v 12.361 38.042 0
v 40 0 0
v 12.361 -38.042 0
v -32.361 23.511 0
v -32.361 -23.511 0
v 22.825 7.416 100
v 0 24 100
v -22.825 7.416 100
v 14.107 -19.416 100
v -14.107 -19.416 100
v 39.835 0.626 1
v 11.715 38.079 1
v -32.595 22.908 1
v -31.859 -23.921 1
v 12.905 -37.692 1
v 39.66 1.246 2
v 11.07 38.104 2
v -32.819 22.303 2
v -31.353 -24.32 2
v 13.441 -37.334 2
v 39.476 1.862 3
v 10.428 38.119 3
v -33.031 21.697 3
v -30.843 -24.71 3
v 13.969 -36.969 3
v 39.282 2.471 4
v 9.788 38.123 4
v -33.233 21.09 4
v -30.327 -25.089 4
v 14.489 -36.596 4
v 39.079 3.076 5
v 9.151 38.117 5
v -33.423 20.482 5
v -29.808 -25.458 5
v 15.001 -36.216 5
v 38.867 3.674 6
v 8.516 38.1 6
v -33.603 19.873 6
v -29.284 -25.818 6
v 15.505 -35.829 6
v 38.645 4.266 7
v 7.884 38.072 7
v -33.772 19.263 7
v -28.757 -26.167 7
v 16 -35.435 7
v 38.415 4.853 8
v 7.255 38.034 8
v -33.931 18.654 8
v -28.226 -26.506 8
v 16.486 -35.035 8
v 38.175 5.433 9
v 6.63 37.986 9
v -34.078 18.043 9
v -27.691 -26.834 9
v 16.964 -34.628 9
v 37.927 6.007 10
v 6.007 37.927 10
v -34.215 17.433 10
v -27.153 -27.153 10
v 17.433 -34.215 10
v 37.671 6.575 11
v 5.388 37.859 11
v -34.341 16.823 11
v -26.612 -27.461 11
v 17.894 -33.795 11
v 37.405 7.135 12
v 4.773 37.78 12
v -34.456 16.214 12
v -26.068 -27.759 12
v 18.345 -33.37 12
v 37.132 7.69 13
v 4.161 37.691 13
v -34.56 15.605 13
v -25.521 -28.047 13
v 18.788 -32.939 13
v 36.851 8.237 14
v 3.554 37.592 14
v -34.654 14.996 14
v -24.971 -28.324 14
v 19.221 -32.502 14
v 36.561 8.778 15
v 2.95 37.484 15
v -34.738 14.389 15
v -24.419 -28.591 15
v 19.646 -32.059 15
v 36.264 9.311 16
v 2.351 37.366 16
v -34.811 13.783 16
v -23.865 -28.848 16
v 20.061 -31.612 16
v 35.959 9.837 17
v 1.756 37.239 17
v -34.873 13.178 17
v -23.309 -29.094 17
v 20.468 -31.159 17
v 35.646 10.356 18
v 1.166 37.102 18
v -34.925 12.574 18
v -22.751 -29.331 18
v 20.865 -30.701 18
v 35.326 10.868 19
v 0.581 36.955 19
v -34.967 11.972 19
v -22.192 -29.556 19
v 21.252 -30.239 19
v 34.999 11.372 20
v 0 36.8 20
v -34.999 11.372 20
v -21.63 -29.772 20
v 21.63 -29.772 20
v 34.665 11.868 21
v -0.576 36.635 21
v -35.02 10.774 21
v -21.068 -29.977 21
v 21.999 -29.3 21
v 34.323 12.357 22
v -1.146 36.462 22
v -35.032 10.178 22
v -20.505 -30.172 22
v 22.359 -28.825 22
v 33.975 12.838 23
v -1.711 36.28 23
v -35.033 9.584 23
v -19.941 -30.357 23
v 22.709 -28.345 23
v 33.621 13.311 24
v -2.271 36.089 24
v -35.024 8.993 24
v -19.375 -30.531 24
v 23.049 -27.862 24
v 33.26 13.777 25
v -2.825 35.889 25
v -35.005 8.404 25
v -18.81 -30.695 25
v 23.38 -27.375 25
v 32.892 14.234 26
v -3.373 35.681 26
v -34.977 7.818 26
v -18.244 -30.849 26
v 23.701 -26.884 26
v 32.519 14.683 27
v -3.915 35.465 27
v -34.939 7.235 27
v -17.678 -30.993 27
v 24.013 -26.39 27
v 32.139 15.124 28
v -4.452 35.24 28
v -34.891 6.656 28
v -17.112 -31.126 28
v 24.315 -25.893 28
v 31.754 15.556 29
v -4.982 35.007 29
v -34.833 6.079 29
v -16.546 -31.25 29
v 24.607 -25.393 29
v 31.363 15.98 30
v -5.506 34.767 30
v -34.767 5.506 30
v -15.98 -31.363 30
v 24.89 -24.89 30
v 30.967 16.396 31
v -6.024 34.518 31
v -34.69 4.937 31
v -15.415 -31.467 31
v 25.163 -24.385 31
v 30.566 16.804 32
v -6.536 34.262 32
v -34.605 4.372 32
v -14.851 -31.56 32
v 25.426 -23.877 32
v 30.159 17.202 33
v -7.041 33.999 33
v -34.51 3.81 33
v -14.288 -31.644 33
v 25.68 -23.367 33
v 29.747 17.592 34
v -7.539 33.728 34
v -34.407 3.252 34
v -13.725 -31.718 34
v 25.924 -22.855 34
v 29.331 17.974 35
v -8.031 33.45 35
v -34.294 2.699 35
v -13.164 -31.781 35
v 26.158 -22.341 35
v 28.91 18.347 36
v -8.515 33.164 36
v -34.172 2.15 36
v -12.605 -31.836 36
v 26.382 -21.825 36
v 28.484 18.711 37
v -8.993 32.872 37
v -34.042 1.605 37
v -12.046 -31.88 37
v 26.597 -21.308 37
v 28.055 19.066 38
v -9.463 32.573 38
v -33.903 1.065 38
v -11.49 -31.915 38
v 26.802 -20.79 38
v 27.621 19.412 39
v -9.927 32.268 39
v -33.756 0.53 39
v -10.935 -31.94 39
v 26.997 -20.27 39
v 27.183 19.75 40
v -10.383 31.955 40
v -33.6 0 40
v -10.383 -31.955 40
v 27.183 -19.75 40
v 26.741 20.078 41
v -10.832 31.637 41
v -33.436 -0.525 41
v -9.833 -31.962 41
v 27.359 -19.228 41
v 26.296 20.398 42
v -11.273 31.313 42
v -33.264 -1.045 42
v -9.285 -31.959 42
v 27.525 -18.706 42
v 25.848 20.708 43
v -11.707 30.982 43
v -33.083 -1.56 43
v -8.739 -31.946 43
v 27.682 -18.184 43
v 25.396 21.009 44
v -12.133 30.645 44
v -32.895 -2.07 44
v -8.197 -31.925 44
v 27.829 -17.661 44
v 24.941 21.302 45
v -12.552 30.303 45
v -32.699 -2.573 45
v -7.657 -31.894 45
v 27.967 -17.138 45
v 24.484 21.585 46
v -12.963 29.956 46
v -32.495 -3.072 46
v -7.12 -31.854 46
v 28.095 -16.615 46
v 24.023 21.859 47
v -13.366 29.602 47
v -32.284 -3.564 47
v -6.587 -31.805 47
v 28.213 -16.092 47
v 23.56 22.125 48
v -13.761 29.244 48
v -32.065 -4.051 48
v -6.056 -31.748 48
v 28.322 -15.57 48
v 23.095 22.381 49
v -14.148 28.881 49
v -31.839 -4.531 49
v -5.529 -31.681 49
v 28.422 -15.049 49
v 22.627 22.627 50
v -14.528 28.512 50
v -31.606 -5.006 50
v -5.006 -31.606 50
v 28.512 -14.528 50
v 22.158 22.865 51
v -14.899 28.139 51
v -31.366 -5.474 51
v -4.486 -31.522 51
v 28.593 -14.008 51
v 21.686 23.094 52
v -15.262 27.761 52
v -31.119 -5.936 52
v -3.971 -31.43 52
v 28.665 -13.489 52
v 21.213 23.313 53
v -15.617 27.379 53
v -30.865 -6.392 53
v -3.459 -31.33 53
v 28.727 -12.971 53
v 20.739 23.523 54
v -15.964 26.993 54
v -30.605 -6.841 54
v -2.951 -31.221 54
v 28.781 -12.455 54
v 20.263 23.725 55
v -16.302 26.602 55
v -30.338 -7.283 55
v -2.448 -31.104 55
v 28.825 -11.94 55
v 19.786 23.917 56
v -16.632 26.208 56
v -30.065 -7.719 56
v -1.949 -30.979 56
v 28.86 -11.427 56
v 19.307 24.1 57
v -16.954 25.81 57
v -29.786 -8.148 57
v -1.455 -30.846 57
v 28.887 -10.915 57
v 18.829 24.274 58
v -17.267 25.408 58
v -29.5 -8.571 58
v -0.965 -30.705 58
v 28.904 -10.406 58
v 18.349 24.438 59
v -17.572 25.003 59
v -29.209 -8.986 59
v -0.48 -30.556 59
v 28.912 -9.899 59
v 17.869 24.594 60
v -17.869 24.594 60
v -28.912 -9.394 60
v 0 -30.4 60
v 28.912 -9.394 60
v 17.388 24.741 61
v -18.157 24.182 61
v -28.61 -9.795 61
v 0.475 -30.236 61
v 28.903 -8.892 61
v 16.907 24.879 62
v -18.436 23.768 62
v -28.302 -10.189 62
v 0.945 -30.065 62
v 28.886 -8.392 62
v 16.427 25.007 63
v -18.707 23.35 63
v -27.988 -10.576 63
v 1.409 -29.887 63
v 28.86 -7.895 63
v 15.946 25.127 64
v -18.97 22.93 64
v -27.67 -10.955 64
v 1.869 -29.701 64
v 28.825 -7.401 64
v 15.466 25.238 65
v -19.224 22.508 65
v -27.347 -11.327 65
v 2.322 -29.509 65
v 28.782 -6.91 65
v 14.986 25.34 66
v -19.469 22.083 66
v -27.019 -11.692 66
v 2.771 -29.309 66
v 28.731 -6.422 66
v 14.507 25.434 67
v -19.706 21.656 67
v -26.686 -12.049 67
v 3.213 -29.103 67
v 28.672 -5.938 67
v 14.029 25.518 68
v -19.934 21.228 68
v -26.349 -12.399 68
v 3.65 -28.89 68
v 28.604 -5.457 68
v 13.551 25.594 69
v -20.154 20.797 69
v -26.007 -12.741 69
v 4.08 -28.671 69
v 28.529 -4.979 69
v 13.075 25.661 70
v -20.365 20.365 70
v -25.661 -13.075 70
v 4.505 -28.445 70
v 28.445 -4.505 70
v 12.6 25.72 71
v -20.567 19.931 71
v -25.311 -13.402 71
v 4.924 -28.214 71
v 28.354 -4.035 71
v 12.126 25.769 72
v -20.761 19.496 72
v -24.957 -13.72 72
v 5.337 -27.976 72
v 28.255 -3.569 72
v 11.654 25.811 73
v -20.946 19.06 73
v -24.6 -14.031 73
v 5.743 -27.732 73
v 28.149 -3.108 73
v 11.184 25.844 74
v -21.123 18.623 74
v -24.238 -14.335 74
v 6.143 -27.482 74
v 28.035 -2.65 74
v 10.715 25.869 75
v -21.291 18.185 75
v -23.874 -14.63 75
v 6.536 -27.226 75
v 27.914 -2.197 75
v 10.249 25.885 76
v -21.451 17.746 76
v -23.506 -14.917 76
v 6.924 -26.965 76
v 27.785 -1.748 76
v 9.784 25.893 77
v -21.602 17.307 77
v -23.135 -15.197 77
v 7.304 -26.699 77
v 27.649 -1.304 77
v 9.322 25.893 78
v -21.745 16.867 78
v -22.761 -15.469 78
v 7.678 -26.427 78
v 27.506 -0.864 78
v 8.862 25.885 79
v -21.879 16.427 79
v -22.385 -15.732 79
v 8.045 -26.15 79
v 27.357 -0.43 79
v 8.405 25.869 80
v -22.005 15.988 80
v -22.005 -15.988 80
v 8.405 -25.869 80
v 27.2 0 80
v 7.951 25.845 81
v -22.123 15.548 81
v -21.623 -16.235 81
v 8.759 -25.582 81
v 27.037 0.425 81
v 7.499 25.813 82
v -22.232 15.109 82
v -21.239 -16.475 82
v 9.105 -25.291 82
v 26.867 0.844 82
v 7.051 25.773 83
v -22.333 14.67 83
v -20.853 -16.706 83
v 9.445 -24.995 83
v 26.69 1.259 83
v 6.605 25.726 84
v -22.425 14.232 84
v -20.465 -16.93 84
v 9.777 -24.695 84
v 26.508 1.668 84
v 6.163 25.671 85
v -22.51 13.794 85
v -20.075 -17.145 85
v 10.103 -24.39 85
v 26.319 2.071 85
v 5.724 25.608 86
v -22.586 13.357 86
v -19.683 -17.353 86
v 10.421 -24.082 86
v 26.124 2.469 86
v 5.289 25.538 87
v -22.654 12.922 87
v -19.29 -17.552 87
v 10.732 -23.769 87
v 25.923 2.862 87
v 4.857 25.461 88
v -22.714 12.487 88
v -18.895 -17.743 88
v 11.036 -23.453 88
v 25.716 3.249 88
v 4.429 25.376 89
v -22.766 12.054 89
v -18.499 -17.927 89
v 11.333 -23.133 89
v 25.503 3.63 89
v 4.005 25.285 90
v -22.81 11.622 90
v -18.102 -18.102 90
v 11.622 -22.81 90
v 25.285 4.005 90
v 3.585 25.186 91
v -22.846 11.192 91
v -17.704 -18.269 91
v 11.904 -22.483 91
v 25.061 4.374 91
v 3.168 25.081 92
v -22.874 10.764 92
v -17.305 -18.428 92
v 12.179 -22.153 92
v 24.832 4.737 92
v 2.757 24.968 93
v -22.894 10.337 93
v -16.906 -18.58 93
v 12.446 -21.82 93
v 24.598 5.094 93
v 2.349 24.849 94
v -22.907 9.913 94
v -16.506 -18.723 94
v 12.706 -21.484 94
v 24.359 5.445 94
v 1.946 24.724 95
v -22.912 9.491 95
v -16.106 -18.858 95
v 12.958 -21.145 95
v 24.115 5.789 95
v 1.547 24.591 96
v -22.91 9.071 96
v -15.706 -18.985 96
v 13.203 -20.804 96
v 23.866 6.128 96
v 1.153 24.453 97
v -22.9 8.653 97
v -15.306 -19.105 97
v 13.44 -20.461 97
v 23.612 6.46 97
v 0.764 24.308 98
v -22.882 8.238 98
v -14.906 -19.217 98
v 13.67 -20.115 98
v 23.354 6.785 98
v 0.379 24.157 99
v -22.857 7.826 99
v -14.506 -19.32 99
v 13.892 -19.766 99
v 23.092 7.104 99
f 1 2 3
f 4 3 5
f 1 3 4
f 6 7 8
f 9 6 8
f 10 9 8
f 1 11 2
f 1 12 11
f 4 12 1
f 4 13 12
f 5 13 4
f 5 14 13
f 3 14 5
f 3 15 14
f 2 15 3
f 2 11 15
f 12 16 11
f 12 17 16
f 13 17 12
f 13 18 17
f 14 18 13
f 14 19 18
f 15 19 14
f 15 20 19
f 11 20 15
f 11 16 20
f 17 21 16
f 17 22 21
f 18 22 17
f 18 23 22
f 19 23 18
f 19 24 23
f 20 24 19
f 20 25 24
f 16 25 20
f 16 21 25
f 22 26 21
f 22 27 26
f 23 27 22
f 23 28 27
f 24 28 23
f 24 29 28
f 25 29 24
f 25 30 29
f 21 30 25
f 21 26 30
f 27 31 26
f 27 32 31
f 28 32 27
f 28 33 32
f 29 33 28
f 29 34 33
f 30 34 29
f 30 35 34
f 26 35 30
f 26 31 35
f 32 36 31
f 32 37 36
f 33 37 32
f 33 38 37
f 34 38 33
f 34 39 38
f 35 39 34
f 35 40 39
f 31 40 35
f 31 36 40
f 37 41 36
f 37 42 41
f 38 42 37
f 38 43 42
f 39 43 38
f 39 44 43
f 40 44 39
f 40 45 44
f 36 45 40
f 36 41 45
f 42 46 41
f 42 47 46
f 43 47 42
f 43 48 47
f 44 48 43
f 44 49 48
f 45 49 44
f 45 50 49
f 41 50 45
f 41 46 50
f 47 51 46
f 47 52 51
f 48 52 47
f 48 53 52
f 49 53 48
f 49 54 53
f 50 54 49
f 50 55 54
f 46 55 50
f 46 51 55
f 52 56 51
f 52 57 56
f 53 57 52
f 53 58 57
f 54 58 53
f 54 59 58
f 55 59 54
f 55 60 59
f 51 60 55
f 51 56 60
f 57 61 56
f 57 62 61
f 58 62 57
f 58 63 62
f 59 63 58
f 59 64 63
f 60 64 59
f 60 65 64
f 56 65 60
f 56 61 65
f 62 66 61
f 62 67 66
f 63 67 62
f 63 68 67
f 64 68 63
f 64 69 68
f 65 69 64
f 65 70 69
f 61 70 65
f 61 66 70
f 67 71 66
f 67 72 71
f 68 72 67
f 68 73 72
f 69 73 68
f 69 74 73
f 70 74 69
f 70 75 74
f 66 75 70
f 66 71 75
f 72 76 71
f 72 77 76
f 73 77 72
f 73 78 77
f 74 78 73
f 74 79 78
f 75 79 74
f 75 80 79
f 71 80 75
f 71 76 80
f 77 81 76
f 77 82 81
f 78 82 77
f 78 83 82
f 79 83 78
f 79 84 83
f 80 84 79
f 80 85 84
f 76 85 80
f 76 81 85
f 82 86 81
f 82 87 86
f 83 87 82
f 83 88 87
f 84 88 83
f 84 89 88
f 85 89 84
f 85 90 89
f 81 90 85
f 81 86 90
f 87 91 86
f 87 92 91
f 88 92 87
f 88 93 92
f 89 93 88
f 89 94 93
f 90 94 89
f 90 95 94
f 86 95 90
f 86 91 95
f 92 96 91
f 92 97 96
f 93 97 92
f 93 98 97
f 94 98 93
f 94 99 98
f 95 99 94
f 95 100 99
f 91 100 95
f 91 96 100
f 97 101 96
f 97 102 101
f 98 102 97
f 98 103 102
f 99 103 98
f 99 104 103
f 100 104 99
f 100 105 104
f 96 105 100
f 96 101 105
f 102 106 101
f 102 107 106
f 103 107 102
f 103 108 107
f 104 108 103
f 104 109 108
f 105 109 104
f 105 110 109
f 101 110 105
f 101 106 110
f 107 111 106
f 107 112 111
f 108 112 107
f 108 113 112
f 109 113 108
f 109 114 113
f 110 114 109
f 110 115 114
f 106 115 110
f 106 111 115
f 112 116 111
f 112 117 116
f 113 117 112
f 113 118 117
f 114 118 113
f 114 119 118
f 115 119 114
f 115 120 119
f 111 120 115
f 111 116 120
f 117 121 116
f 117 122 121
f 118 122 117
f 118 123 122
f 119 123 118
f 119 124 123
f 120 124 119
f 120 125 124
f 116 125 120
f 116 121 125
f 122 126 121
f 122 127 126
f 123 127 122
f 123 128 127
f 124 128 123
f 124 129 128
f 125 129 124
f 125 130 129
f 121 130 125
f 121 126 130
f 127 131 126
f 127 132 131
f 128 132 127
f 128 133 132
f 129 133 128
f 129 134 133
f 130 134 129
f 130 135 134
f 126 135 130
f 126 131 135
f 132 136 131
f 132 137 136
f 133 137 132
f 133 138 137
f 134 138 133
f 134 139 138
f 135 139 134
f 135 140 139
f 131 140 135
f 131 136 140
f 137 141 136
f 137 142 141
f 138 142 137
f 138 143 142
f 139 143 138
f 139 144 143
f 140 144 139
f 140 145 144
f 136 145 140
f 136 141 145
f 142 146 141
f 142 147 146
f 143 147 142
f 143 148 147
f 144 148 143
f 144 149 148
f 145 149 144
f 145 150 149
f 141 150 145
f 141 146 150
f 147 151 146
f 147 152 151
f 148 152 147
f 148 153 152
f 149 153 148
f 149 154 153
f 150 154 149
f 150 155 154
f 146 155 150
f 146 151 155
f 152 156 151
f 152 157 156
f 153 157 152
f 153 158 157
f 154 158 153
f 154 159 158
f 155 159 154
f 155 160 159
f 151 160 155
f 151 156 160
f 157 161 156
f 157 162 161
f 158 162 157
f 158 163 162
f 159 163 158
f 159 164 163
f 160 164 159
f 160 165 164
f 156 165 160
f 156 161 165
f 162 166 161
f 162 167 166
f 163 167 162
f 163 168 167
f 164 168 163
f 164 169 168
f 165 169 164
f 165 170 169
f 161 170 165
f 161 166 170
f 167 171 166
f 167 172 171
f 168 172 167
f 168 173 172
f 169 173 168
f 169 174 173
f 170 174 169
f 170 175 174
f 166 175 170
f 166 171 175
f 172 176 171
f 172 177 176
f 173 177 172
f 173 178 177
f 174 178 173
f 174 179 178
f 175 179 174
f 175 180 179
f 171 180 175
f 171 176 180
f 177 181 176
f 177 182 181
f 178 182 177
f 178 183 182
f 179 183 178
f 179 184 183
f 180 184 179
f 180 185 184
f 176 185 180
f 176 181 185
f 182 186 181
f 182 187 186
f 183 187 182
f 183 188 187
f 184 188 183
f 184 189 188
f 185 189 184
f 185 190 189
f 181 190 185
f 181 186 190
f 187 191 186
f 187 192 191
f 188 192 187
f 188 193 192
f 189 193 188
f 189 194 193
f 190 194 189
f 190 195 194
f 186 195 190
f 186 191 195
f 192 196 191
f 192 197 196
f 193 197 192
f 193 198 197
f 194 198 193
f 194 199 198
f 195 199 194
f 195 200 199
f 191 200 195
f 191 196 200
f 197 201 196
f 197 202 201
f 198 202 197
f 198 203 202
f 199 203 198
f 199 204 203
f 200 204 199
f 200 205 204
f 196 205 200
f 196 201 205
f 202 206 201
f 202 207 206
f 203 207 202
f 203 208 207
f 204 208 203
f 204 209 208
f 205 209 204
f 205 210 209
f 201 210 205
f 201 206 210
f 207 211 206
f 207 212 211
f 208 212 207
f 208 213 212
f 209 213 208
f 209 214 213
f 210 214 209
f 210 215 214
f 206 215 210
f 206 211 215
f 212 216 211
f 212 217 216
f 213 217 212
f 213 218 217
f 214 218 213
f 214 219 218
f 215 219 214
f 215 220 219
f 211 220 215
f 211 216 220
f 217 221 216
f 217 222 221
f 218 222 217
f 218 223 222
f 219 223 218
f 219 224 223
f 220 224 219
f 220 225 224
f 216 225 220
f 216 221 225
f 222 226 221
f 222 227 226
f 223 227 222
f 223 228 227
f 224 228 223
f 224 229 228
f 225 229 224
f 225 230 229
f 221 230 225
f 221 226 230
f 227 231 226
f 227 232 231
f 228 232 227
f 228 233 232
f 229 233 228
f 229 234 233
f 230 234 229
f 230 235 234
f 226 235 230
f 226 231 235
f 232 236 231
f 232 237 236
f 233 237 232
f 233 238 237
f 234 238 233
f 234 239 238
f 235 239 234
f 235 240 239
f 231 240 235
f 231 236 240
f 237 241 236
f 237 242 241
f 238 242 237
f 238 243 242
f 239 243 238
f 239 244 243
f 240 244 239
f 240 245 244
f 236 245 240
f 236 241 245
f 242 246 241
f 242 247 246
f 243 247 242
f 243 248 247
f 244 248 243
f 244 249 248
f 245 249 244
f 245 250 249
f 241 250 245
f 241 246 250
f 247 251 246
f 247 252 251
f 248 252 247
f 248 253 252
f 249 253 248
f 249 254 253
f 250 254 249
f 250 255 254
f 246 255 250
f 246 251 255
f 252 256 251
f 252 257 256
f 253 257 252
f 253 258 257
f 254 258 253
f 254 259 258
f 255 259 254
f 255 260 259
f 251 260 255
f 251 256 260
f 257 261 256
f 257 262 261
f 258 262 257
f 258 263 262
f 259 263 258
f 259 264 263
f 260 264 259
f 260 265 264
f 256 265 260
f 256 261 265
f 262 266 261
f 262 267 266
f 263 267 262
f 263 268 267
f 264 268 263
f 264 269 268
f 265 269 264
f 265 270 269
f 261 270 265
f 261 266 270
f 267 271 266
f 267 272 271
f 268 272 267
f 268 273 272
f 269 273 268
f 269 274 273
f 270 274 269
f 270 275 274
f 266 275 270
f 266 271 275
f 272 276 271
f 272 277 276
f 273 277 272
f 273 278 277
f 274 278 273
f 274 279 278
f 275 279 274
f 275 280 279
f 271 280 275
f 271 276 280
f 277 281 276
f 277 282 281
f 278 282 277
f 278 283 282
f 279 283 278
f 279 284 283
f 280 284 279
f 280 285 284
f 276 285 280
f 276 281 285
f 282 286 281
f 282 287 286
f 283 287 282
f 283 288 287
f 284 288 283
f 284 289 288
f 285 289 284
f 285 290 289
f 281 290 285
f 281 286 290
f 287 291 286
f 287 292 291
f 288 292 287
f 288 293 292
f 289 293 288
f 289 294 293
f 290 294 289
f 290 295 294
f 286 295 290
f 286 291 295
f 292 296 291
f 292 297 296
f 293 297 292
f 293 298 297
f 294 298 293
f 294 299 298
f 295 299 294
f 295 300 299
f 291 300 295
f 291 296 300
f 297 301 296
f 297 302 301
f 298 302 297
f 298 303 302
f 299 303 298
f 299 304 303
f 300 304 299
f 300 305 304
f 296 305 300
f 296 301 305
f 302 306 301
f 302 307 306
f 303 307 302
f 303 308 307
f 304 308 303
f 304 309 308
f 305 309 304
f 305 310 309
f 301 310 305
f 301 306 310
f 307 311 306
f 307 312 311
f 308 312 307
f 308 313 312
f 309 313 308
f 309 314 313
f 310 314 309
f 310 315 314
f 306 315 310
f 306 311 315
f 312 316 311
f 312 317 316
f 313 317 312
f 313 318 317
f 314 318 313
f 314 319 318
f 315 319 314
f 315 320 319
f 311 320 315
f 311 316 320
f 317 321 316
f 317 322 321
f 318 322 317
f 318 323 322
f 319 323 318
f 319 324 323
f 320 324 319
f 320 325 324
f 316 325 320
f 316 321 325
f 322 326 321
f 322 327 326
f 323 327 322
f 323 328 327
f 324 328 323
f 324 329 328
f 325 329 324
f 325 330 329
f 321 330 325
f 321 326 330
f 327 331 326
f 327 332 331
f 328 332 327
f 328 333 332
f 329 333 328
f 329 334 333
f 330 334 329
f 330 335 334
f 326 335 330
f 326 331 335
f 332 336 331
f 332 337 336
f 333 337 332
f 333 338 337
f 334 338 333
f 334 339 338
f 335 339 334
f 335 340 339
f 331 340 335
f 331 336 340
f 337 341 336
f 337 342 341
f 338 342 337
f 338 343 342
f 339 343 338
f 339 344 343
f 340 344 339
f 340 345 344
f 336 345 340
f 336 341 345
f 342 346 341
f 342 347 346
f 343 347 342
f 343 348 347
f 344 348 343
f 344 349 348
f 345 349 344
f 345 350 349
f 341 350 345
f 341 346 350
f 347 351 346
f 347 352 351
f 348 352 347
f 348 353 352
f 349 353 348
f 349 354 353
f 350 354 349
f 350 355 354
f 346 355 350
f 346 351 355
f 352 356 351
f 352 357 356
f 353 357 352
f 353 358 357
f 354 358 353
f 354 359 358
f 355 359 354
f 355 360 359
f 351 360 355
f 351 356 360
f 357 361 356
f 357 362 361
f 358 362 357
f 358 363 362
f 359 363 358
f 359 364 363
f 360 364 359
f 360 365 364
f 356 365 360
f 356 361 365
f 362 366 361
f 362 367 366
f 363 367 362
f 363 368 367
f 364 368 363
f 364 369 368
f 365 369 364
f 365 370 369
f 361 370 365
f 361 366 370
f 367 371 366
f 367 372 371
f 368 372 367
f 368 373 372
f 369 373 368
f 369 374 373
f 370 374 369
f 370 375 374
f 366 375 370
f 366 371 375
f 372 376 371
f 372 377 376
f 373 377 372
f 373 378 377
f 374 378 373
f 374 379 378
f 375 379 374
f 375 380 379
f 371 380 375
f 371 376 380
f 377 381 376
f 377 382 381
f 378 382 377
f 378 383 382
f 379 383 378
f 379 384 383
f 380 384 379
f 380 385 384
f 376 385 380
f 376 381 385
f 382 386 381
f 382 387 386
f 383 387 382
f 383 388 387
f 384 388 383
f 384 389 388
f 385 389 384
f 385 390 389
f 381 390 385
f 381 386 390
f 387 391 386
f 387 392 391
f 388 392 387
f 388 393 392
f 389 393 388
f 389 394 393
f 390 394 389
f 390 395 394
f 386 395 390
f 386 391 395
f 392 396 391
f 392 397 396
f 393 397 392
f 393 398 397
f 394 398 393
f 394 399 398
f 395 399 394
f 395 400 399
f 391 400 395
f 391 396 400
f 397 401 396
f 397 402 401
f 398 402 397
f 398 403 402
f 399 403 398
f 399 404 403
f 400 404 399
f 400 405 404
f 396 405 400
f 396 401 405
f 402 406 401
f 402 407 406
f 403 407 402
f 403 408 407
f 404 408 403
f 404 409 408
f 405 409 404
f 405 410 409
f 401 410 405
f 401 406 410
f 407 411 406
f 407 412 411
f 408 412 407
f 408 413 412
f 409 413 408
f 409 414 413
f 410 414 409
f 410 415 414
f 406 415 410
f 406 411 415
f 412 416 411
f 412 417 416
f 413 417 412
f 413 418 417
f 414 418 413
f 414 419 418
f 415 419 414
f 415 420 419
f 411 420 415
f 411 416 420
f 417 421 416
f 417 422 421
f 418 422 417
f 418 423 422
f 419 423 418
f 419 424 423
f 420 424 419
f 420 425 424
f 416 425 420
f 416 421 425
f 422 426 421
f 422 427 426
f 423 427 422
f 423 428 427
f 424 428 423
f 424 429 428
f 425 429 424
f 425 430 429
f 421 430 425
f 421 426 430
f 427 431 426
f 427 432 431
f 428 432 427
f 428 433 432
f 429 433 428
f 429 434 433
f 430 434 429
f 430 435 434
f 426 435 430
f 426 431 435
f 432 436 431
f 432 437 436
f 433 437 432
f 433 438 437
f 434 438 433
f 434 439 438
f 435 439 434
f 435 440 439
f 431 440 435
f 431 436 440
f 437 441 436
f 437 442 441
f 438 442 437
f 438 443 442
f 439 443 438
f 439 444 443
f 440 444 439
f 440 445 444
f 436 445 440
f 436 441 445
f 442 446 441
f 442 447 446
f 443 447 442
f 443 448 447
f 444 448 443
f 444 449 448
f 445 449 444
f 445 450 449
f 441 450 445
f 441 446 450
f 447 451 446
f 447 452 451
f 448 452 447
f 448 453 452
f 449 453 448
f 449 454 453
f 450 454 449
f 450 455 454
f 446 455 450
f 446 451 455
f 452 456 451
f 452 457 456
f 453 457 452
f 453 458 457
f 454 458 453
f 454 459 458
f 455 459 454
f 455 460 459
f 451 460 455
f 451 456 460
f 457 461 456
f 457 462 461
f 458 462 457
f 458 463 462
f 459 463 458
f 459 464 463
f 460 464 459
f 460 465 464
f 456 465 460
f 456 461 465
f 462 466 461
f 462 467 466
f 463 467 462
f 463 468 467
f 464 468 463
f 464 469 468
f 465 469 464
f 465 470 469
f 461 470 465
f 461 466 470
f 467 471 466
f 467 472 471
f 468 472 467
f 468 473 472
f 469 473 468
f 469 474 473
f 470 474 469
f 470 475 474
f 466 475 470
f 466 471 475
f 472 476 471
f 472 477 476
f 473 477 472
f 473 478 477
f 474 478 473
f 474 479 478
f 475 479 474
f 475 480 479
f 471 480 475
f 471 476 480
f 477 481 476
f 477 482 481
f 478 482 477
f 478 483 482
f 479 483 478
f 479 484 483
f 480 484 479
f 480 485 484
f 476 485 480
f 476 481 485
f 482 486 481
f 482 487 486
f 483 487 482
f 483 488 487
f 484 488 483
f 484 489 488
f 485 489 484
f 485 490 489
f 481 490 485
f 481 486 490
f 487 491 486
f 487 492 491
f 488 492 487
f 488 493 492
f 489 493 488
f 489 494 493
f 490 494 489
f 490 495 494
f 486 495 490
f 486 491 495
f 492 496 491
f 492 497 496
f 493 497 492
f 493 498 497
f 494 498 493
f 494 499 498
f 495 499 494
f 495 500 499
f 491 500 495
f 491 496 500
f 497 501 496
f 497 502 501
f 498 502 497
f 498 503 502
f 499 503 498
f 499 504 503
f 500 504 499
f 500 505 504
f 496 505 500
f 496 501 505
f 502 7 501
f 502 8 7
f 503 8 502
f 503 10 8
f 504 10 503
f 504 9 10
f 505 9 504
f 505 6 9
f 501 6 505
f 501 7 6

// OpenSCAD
num_corners=5;//[3:1:10]
height=100;//[40:10:150]
base_radius=40;//[30:5:80]
angle_twist=-90;//[-180:10:180]
top_scale=.6;//[.1:.2:2]
linear_extrude(height = height, center = false, convexity = 50, twist = angle_twist,scale=top_scale,$fn=num_corners,slices=height)
 circle(base_radius);
